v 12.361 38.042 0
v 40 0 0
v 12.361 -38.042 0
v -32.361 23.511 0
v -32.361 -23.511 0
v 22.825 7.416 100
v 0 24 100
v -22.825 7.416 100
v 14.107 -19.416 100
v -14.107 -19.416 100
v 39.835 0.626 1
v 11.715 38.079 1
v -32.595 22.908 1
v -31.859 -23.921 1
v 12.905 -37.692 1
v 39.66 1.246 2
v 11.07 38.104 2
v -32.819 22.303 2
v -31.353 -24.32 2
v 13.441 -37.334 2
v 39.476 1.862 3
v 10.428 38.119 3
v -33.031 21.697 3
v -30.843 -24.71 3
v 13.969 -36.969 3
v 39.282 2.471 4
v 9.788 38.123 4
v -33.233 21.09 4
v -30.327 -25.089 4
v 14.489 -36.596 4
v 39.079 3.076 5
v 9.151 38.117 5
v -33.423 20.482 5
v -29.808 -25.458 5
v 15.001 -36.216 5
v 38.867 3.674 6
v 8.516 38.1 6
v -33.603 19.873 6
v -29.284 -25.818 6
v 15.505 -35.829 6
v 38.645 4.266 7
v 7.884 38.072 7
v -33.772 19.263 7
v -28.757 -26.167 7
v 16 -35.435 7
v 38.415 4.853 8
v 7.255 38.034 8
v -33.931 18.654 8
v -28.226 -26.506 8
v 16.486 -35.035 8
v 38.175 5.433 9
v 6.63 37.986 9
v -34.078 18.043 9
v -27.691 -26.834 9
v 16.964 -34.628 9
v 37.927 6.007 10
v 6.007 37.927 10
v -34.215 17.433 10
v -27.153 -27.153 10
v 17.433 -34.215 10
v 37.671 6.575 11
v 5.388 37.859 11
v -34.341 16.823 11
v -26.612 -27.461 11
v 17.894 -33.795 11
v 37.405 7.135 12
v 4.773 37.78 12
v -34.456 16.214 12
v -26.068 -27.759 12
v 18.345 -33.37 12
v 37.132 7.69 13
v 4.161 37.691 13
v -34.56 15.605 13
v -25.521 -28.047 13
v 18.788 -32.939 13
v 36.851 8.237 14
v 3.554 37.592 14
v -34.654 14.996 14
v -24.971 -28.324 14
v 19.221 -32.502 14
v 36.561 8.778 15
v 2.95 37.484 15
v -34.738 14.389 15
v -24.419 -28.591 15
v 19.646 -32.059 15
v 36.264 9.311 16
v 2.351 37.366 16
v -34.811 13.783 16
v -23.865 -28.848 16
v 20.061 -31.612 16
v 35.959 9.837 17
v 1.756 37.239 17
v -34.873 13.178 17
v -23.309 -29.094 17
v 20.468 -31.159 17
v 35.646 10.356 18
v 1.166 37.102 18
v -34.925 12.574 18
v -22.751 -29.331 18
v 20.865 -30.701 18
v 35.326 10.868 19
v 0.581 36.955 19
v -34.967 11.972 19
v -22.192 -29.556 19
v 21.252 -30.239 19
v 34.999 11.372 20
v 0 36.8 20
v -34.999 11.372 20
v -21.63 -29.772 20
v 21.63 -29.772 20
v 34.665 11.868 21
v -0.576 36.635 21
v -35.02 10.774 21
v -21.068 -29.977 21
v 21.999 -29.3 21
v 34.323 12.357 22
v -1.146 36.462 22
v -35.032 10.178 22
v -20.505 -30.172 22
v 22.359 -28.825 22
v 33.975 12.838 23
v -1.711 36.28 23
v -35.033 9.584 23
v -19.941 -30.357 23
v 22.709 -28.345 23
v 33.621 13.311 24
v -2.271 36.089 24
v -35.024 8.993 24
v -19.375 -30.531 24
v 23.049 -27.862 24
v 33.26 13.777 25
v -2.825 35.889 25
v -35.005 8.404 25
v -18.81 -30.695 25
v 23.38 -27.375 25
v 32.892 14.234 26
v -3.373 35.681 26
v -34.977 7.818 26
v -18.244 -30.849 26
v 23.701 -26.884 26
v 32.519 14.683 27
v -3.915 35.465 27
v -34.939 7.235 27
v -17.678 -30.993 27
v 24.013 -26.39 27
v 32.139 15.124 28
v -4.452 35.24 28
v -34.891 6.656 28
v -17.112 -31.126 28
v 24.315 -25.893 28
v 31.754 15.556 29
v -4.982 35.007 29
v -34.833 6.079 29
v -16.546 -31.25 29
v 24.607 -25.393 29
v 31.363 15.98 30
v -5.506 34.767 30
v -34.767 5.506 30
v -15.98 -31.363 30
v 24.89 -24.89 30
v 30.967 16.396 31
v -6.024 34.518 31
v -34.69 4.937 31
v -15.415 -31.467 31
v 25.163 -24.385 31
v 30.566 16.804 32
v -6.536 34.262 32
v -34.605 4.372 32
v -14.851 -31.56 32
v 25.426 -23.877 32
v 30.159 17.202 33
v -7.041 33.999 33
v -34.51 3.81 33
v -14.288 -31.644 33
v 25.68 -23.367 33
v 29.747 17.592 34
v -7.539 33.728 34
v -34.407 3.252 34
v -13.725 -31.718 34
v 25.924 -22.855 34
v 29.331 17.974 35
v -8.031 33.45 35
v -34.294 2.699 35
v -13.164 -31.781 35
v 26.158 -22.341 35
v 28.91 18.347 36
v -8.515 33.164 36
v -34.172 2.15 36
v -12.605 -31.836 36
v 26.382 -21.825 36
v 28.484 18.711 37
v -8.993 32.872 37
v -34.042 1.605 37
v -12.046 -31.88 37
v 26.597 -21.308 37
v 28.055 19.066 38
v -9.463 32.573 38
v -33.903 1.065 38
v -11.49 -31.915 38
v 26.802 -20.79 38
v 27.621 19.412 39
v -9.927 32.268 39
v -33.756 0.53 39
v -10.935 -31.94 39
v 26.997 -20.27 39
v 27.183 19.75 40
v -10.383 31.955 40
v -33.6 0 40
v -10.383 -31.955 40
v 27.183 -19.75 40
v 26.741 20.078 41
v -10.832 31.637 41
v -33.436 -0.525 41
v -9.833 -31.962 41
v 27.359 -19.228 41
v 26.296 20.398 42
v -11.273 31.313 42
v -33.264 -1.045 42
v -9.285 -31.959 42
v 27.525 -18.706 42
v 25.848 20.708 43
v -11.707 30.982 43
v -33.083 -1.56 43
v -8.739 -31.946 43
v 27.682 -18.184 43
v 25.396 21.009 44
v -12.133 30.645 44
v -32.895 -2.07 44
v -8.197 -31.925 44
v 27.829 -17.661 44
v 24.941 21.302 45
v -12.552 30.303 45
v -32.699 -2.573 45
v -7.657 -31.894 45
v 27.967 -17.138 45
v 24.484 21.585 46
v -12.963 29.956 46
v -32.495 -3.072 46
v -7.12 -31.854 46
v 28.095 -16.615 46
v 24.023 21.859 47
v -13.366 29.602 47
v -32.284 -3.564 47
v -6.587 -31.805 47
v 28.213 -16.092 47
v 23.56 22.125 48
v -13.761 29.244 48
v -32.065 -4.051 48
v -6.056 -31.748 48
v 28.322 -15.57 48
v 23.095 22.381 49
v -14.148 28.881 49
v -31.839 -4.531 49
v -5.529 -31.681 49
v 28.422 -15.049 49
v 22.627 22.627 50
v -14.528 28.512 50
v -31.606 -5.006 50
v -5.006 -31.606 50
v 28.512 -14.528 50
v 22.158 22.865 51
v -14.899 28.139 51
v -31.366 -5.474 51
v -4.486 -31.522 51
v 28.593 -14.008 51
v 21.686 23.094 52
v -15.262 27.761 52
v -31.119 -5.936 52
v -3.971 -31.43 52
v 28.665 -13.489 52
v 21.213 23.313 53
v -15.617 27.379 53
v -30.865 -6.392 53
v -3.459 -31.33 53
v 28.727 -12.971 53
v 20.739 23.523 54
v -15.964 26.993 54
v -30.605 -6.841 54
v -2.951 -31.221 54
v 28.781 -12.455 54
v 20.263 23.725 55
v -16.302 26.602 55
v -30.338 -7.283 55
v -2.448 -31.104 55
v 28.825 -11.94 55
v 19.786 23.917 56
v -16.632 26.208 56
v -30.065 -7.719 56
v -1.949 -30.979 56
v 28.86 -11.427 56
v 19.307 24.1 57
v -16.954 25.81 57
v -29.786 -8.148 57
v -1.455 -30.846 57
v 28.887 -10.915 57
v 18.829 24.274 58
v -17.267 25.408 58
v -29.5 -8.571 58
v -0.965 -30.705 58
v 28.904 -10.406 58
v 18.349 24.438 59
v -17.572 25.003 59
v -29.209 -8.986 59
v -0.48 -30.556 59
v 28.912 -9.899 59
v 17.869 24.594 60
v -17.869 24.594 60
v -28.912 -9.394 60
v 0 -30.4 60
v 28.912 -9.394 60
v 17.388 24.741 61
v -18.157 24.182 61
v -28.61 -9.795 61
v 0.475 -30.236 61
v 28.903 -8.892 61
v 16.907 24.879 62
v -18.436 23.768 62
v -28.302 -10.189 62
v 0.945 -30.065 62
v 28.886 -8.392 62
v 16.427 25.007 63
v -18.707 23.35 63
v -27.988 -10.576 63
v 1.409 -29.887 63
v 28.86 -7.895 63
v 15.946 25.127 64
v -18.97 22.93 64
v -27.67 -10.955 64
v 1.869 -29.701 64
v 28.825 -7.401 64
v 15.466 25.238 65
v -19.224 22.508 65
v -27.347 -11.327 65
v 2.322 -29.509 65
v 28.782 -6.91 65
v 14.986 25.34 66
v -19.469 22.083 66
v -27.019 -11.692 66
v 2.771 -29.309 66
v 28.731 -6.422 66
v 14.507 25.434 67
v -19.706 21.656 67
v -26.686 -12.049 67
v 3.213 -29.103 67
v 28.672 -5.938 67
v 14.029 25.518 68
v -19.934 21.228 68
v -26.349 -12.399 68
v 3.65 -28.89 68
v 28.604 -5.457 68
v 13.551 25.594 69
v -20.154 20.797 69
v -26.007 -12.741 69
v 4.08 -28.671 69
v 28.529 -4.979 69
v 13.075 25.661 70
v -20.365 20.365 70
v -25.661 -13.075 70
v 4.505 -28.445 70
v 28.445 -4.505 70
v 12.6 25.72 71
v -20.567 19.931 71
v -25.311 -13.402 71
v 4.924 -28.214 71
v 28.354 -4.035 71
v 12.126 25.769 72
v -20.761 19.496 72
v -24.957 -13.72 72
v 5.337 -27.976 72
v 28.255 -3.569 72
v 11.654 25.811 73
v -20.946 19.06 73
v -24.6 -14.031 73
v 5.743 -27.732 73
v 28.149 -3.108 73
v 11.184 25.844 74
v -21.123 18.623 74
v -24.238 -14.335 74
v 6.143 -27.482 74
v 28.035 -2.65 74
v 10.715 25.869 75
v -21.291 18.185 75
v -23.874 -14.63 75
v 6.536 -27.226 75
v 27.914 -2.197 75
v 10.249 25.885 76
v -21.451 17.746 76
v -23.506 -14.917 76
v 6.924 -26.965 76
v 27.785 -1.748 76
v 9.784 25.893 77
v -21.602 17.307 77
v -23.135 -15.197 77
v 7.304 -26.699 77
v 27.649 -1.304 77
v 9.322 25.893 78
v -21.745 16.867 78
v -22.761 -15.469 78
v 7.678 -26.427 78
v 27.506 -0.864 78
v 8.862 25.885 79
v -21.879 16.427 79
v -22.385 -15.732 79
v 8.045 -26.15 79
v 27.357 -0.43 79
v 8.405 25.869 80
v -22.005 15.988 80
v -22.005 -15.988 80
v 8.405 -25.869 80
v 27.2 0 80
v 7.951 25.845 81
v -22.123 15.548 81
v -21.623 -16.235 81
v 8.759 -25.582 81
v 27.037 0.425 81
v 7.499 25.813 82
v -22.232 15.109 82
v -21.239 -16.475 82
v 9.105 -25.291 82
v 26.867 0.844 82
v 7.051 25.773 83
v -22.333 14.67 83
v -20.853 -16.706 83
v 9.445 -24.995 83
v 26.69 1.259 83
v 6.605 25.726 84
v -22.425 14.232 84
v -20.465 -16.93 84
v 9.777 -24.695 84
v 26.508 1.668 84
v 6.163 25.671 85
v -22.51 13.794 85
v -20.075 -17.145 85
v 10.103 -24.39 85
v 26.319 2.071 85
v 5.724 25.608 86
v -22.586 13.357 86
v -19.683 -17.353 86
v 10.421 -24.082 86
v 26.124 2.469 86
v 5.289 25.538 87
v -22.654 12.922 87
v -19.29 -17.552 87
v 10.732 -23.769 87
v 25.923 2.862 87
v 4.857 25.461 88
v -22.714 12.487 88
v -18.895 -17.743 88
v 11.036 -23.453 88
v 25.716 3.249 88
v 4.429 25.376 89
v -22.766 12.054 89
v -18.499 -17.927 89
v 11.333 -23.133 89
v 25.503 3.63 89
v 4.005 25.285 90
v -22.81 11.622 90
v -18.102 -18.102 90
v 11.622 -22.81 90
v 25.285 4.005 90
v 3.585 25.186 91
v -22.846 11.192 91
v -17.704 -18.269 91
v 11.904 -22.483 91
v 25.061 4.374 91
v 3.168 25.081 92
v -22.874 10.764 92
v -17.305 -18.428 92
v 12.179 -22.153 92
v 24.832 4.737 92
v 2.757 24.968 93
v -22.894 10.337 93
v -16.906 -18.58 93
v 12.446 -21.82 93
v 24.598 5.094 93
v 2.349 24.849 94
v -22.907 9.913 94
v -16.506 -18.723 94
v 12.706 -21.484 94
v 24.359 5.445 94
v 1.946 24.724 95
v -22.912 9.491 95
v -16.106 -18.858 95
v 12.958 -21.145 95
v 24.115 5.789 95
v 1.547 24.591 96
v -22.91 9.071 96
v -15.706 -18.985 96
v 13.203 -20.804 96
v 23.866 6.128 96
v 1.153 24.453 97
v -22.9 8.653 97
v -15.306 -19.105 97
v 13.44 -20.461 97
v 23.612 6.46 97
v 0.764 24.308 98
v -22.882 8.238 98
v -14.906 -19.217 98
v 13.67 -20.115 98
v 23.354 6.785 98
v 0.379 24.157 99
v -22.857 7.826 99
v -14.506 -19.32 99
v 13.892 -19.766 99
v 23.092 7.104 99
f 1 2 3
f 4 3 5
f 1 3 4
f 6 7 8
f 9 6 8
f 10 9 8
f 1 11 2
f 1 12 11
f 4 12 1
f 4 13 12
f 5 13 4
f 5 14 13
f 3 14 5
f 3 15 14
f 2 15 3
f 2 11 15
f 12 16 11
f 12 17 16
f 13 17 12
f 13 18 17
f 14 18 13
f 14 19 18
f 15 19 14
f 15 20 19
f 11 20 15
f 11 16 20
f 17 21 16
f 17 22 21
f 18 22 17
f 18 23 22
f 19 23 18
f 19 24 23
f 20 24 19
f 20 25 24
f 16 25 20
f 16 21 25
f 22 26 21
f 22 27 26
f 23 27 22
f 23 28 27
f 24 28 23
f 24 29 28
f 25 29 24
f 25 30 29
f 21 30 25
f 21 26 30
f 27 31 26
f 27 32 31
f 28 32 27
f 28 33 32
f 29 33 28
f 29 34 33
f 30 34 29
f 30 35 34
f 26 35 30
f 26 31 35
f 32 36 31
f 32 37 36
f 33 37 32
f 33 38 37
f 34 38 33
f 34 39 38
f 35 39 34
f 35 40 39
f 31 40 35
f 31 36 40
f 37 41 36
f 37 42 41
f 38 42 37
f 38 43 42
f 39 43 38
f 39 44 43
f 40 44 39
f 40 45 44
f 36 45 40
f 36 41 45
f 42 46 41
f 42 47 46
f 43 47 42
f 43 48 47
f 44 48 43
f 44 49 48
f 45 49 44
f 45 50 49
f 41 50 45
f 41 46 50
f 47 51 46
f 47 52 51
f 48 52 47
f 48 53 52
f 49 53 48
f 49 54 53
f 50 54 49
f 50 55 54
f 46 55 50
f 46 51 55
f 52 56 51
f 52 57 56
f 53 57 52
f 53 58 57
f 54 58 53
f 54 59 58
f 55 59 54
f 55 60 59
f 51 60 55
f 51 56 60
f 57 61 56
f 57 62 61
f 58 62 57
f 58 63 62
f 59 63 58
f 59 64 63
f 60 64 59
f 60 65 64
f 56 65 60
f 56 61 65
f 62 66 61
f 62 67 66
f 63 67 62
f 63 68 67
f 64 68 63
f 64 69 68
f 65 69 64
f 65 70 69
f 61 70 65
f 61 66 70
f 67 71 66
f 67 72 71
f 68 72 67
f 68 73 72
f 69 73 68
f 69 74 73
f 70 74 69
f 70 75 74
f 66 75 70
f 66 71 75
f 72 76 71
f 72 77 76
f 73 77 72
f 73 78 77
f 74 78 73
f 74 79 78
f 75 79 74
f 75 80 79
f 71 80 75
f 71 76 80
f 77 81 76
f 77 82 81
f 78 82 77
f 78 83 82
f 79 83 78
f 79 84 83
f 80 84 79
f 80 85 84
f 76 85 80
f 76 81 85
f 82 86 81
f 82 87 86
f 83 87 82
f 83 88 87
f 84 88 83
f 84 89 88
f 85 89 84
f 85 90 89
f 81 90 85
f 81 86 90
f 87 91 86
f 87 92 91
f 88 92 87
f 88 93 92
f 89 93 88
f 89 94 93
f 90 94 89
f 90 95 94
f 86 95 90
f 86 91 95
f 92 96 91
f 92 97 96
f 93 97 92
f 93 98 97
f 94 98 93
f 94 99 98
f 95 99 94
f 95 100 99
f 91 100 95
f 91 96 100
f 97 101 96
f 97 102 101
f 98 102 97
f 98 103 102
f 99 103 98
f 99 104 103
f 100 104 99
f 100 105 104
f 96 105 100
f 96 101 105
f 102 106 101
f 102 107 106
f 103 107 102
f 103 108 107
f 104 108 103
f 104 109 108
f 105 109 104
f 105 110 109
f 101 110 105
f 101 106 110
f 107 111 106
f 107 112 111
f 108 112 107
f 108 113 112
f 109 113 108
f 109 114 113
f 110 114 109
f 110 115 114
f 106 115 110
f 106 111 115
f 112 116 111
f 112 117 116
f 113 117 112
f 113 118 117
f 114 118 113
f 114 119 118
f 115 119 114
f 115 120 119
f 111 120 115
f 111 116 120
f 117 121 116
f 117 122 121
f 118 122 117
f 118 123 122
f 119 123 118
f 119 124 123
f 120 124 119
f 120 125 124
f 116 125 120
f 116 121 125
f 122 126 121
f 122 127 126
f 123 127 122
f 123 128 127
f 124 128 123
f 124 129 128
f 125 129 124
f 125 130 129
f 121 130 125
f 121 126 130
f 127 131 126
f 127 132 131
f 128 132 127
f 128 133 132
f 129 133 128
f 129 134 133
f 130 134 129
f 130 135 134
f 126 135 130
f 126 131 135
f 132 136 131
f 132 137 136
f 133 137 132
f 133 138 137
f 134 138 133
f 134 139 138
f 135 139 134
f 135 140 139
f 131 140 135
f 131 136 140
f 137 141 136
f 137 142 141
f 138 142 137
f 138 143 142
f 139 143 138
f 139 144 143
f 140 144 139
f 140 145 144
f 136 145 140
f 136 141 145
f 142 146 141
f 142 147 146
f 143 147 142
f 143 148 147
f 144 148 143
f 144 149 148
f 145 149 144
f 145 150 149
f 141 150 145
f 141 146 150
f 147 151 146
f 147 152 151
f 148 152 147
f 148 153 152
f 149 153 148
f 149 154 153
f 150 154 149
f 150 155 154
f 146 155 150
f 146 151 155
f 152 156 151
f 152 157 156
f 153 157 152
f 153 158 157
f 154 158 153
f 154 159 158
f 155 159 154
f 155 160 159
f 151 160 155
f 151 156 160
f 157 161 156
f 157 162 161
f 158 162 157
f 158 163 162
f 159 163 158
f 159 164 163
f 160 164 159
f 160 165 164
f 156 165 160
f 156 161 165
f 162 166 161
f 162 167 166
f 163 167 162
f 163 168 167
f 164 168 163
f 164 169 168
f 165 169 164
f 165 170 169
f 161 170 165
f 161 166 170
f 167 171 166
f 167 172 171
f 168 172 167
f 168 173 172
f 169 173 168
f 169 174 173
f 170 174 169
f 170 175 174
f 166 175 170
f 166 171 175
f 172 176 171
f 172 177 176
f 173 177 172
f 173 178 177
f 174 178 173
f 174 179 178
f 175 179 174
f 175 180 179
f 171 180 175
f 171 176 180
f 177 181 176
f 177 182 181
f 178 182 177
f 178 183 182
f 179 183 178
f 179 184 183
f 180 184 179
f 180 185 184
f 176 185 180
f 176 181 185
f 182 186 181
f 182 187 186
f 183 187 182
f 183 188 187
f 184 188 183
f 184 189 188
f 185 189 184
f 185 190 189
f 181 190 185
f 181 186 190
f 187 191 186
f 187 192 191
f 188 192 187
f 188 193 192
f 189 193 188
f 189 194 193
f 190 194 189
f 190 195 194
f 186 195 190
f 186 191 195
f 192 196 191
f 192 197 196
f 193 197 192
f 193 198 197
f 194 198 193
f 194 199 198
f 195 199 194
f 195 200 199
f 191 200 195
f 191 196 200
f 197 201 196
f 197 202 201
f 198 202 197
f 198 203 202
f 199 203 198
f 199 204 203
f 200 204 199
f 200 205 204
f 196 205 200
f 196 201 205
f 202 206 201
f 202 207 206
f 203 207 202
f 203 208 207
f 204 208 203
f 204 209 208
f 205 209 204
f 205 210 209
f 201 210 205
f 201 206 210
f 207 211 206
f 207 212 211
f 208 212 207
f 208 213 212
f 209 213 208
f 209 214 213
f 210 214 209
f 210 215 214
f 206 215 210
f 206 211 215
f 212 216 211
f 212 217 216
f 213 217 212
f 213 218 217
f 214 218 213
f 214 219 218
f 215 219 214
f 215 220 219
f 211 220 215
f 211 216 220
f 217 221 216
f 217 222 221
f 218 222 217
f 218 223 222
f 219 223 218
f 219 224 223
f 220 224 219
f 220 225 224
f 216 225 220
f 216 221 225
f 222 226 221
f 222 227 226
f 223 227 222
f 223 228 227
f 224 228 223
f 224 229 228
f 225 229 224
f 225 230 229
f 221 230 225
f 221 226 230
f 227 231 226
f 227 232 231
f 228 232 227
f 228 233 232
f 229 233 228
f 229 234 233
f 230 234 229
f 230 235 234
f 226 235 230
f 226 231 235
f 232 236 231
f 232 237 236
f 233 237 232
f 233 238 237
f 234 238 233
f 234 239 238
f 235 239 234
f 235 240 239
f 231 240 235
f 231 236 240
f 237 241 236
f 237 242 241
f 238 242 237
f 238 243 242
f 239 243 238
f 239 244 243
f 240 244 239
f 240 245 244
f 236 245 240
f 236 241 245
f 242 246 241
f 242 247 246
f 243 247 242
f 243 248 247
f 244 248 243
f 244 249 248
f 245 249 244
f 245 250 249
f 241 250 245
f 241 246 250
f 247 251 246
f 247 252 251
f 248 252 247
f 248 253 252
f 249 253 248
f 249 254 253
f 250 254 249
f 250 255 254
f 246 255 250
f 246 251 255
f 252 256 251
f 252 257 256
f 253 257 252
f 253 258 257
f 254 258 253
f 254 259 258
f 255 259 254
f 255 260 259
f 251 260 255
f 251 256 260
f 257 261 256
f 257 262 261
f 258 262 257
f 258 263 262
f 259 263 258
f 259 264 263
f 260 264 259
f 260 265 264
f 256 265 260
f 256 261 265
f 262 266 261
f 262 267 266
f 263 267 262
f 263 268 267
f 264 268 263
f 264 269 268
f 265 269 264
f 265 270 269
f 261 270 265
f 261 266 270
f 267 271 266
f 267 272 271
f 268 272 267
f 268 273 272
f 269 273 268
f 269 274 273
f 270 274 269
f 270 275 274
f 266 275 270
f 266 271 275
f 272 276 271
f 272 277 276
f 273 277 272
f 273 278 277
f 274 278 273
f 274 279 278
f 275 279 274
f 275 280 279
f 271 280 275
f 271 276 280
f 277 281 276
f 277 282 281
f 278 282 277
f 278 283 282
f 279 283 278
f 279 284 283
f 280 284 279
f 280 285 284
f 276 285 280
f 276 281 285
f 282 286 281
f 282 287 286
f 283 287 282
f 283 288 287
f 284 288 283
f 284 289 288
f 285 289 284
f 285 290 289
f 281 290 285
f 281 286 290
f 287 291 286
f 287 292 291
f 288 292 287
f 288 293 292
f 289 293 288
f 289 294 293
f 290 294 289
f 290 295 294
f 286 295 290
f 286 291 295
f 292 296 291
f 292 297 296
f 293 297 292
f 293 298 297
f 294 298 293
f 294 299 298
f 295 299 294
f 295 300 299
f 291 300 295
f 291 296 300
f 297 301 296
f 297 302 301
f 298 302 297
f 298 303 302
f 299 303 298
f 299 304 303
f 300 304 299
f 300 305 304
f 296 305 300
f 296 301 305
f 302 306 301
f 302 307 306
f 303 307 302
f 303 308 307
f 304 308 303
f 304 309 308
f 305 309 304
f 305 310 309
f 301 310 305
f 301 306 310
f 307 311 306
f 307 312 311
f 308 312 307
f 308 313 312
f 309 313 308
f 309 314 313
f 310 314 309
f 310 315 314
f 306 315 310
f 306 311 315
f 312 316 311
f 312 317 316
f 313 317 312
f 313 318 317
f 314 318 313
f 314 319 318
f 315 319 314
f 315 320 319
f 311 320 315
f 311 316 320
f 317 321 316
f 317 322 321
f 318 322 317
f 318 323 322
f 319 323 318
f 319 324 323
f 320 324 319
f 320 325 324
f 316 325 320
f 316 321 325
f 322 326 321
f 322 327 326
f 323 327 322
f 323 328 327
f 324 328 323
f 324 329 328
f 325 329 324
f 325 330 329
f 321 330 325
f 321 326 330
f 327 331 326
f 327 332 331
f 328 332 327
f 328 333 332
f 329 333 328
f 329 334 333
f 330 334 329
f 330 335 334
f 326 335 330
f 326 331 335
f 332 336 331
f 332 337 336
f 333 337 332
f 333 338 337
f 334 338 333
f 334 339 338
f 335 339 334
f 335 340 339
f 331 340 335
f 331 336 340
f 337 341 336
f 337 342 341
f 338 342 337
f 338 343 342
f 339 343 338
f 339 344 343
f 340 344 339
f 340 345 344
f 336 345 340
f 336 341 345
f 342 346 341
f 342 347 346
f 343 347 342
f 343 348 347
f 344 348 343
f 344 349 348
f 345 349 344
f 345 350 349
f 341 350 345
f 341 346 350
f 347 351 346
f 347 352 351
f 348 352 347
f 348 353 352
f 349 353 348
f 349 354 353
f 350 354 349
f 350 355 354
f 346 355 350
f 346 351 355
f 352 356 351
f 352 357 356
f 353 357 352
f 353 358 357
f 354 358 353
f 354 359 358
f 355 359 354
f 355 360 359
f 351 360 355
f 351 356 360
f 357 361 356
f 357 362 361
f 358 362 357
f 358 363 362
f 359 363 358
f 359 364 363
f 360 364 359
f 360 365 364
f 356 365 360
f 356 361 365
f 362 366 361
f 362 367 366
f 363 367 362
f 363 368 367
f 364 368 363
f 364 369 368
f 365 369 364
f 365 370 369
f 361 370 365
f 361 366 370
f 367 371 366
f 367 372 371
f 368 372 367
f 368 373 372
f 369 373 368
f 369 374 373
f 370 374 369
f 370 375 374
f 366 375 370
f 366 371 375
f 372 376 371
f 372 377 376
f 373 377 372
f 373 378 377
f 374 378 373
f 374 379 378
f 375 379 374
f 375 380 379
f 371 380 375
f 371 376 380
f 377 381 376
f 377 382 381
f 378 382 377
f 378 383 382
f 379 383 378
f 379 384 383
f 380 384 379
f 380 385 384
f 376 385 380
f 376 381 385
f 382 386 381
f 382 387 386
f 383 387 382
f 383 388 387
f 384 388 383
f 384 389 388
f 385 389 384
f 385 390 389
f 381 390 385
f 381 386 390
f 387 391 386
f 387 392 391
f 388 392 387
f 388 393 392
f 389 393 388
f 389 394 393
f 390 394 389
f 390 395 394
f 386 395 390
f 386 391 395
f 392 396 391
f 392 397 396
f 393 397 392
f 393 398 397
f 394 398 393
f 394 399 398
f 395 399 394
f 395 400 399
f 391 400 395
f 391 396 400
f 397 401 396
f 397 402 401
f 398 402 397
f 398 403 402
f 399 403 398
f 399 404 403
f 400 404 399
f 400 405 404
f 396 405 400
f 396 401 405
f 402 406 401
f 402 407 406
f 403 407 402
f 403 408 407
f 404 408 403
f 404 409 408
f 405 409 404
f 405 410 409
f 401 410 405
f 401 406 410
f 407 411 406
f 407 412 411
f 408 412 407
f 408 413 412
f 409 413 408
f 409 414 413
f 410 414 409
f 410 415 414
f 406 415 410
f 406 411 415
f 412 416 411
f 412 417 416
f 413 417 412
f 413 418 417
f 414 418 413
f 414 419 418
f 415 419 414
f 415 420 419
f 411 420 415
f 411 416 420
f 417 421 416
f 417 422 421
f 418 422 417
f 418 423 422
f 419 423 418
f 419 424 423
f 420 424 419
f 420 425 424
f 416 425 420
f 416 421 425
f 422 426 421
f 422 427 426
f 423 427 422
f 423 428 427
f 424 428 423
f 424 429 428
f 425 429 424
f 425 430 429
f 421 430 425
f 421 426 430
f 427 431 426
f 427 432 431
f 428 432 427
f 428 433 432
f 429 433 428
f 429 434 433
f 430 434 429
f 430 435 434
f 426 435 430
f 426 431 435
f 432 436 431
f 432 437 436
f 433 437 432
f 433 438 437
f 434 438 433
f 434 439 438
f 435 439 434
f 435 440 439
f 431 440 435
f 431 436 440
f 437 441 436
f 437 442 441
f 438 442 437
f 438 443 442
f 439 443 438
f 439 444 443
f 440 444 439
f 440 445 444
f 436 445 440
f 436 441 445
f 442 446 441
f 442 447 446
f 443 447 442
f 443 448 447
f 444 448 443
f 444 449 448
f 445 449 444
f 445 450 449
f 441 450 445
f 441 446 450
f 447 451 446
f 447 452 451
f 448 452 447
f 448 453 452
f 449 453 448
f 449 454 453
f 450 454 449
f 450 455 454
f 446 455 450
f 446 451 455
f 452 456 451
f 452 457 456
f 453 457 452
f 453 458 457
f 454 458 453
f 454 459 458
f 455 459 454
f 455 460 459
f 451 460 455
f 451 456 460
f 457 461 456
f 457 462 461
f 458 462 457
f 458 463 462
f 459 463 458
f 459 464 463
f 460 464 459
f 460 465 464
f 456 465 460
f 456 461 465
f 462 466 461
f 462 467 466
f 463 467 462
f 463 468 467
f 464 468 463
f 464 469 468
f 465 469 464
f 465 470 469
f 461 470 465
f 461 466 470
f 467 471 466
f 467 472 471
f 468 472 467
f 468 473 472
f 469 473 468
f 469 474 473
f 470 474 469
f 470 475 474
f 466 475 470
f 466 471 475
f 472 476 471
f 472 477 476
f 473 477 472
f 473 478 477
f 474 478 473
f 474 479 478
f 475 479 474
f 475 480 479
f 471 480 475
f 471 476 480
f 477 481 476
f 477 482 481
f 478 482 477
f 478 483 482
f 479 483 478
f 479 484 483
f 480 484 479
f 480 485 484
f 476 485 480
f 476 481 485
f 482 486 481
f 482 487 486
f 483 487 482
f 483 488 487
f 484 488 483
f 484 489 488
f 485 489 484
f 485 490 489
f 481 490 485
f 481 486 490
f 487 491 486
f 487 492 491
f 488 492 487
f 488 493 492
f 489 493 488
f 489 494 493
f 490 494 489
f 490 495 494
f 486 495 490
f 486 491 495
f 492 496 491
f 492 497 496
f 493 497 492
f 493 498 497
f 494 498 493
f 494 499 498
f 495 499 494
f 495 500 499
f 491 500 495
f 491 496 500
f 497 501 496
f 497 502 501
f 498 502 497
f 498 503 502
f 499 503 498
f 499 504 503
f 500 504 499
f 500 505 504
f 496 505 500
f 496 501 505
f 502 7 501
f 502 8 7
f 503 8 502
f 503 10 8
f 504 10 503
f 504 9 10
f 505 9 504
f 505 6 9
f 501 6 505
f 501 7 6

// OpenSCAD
num_corners=5;//[3:1:10]
height=100;//[40:10:150]
base_radius=40;//[30:5:80]
angle_twist=-90;//[-180:10:180]
top_scale=.6;//[.1:.2:2]
linear_extrude(height = height, center = false, convexity = 50, twist = angle_twist,scale=top_scale,$fn=num_corners,slices=height)
 circle(base_radius);
